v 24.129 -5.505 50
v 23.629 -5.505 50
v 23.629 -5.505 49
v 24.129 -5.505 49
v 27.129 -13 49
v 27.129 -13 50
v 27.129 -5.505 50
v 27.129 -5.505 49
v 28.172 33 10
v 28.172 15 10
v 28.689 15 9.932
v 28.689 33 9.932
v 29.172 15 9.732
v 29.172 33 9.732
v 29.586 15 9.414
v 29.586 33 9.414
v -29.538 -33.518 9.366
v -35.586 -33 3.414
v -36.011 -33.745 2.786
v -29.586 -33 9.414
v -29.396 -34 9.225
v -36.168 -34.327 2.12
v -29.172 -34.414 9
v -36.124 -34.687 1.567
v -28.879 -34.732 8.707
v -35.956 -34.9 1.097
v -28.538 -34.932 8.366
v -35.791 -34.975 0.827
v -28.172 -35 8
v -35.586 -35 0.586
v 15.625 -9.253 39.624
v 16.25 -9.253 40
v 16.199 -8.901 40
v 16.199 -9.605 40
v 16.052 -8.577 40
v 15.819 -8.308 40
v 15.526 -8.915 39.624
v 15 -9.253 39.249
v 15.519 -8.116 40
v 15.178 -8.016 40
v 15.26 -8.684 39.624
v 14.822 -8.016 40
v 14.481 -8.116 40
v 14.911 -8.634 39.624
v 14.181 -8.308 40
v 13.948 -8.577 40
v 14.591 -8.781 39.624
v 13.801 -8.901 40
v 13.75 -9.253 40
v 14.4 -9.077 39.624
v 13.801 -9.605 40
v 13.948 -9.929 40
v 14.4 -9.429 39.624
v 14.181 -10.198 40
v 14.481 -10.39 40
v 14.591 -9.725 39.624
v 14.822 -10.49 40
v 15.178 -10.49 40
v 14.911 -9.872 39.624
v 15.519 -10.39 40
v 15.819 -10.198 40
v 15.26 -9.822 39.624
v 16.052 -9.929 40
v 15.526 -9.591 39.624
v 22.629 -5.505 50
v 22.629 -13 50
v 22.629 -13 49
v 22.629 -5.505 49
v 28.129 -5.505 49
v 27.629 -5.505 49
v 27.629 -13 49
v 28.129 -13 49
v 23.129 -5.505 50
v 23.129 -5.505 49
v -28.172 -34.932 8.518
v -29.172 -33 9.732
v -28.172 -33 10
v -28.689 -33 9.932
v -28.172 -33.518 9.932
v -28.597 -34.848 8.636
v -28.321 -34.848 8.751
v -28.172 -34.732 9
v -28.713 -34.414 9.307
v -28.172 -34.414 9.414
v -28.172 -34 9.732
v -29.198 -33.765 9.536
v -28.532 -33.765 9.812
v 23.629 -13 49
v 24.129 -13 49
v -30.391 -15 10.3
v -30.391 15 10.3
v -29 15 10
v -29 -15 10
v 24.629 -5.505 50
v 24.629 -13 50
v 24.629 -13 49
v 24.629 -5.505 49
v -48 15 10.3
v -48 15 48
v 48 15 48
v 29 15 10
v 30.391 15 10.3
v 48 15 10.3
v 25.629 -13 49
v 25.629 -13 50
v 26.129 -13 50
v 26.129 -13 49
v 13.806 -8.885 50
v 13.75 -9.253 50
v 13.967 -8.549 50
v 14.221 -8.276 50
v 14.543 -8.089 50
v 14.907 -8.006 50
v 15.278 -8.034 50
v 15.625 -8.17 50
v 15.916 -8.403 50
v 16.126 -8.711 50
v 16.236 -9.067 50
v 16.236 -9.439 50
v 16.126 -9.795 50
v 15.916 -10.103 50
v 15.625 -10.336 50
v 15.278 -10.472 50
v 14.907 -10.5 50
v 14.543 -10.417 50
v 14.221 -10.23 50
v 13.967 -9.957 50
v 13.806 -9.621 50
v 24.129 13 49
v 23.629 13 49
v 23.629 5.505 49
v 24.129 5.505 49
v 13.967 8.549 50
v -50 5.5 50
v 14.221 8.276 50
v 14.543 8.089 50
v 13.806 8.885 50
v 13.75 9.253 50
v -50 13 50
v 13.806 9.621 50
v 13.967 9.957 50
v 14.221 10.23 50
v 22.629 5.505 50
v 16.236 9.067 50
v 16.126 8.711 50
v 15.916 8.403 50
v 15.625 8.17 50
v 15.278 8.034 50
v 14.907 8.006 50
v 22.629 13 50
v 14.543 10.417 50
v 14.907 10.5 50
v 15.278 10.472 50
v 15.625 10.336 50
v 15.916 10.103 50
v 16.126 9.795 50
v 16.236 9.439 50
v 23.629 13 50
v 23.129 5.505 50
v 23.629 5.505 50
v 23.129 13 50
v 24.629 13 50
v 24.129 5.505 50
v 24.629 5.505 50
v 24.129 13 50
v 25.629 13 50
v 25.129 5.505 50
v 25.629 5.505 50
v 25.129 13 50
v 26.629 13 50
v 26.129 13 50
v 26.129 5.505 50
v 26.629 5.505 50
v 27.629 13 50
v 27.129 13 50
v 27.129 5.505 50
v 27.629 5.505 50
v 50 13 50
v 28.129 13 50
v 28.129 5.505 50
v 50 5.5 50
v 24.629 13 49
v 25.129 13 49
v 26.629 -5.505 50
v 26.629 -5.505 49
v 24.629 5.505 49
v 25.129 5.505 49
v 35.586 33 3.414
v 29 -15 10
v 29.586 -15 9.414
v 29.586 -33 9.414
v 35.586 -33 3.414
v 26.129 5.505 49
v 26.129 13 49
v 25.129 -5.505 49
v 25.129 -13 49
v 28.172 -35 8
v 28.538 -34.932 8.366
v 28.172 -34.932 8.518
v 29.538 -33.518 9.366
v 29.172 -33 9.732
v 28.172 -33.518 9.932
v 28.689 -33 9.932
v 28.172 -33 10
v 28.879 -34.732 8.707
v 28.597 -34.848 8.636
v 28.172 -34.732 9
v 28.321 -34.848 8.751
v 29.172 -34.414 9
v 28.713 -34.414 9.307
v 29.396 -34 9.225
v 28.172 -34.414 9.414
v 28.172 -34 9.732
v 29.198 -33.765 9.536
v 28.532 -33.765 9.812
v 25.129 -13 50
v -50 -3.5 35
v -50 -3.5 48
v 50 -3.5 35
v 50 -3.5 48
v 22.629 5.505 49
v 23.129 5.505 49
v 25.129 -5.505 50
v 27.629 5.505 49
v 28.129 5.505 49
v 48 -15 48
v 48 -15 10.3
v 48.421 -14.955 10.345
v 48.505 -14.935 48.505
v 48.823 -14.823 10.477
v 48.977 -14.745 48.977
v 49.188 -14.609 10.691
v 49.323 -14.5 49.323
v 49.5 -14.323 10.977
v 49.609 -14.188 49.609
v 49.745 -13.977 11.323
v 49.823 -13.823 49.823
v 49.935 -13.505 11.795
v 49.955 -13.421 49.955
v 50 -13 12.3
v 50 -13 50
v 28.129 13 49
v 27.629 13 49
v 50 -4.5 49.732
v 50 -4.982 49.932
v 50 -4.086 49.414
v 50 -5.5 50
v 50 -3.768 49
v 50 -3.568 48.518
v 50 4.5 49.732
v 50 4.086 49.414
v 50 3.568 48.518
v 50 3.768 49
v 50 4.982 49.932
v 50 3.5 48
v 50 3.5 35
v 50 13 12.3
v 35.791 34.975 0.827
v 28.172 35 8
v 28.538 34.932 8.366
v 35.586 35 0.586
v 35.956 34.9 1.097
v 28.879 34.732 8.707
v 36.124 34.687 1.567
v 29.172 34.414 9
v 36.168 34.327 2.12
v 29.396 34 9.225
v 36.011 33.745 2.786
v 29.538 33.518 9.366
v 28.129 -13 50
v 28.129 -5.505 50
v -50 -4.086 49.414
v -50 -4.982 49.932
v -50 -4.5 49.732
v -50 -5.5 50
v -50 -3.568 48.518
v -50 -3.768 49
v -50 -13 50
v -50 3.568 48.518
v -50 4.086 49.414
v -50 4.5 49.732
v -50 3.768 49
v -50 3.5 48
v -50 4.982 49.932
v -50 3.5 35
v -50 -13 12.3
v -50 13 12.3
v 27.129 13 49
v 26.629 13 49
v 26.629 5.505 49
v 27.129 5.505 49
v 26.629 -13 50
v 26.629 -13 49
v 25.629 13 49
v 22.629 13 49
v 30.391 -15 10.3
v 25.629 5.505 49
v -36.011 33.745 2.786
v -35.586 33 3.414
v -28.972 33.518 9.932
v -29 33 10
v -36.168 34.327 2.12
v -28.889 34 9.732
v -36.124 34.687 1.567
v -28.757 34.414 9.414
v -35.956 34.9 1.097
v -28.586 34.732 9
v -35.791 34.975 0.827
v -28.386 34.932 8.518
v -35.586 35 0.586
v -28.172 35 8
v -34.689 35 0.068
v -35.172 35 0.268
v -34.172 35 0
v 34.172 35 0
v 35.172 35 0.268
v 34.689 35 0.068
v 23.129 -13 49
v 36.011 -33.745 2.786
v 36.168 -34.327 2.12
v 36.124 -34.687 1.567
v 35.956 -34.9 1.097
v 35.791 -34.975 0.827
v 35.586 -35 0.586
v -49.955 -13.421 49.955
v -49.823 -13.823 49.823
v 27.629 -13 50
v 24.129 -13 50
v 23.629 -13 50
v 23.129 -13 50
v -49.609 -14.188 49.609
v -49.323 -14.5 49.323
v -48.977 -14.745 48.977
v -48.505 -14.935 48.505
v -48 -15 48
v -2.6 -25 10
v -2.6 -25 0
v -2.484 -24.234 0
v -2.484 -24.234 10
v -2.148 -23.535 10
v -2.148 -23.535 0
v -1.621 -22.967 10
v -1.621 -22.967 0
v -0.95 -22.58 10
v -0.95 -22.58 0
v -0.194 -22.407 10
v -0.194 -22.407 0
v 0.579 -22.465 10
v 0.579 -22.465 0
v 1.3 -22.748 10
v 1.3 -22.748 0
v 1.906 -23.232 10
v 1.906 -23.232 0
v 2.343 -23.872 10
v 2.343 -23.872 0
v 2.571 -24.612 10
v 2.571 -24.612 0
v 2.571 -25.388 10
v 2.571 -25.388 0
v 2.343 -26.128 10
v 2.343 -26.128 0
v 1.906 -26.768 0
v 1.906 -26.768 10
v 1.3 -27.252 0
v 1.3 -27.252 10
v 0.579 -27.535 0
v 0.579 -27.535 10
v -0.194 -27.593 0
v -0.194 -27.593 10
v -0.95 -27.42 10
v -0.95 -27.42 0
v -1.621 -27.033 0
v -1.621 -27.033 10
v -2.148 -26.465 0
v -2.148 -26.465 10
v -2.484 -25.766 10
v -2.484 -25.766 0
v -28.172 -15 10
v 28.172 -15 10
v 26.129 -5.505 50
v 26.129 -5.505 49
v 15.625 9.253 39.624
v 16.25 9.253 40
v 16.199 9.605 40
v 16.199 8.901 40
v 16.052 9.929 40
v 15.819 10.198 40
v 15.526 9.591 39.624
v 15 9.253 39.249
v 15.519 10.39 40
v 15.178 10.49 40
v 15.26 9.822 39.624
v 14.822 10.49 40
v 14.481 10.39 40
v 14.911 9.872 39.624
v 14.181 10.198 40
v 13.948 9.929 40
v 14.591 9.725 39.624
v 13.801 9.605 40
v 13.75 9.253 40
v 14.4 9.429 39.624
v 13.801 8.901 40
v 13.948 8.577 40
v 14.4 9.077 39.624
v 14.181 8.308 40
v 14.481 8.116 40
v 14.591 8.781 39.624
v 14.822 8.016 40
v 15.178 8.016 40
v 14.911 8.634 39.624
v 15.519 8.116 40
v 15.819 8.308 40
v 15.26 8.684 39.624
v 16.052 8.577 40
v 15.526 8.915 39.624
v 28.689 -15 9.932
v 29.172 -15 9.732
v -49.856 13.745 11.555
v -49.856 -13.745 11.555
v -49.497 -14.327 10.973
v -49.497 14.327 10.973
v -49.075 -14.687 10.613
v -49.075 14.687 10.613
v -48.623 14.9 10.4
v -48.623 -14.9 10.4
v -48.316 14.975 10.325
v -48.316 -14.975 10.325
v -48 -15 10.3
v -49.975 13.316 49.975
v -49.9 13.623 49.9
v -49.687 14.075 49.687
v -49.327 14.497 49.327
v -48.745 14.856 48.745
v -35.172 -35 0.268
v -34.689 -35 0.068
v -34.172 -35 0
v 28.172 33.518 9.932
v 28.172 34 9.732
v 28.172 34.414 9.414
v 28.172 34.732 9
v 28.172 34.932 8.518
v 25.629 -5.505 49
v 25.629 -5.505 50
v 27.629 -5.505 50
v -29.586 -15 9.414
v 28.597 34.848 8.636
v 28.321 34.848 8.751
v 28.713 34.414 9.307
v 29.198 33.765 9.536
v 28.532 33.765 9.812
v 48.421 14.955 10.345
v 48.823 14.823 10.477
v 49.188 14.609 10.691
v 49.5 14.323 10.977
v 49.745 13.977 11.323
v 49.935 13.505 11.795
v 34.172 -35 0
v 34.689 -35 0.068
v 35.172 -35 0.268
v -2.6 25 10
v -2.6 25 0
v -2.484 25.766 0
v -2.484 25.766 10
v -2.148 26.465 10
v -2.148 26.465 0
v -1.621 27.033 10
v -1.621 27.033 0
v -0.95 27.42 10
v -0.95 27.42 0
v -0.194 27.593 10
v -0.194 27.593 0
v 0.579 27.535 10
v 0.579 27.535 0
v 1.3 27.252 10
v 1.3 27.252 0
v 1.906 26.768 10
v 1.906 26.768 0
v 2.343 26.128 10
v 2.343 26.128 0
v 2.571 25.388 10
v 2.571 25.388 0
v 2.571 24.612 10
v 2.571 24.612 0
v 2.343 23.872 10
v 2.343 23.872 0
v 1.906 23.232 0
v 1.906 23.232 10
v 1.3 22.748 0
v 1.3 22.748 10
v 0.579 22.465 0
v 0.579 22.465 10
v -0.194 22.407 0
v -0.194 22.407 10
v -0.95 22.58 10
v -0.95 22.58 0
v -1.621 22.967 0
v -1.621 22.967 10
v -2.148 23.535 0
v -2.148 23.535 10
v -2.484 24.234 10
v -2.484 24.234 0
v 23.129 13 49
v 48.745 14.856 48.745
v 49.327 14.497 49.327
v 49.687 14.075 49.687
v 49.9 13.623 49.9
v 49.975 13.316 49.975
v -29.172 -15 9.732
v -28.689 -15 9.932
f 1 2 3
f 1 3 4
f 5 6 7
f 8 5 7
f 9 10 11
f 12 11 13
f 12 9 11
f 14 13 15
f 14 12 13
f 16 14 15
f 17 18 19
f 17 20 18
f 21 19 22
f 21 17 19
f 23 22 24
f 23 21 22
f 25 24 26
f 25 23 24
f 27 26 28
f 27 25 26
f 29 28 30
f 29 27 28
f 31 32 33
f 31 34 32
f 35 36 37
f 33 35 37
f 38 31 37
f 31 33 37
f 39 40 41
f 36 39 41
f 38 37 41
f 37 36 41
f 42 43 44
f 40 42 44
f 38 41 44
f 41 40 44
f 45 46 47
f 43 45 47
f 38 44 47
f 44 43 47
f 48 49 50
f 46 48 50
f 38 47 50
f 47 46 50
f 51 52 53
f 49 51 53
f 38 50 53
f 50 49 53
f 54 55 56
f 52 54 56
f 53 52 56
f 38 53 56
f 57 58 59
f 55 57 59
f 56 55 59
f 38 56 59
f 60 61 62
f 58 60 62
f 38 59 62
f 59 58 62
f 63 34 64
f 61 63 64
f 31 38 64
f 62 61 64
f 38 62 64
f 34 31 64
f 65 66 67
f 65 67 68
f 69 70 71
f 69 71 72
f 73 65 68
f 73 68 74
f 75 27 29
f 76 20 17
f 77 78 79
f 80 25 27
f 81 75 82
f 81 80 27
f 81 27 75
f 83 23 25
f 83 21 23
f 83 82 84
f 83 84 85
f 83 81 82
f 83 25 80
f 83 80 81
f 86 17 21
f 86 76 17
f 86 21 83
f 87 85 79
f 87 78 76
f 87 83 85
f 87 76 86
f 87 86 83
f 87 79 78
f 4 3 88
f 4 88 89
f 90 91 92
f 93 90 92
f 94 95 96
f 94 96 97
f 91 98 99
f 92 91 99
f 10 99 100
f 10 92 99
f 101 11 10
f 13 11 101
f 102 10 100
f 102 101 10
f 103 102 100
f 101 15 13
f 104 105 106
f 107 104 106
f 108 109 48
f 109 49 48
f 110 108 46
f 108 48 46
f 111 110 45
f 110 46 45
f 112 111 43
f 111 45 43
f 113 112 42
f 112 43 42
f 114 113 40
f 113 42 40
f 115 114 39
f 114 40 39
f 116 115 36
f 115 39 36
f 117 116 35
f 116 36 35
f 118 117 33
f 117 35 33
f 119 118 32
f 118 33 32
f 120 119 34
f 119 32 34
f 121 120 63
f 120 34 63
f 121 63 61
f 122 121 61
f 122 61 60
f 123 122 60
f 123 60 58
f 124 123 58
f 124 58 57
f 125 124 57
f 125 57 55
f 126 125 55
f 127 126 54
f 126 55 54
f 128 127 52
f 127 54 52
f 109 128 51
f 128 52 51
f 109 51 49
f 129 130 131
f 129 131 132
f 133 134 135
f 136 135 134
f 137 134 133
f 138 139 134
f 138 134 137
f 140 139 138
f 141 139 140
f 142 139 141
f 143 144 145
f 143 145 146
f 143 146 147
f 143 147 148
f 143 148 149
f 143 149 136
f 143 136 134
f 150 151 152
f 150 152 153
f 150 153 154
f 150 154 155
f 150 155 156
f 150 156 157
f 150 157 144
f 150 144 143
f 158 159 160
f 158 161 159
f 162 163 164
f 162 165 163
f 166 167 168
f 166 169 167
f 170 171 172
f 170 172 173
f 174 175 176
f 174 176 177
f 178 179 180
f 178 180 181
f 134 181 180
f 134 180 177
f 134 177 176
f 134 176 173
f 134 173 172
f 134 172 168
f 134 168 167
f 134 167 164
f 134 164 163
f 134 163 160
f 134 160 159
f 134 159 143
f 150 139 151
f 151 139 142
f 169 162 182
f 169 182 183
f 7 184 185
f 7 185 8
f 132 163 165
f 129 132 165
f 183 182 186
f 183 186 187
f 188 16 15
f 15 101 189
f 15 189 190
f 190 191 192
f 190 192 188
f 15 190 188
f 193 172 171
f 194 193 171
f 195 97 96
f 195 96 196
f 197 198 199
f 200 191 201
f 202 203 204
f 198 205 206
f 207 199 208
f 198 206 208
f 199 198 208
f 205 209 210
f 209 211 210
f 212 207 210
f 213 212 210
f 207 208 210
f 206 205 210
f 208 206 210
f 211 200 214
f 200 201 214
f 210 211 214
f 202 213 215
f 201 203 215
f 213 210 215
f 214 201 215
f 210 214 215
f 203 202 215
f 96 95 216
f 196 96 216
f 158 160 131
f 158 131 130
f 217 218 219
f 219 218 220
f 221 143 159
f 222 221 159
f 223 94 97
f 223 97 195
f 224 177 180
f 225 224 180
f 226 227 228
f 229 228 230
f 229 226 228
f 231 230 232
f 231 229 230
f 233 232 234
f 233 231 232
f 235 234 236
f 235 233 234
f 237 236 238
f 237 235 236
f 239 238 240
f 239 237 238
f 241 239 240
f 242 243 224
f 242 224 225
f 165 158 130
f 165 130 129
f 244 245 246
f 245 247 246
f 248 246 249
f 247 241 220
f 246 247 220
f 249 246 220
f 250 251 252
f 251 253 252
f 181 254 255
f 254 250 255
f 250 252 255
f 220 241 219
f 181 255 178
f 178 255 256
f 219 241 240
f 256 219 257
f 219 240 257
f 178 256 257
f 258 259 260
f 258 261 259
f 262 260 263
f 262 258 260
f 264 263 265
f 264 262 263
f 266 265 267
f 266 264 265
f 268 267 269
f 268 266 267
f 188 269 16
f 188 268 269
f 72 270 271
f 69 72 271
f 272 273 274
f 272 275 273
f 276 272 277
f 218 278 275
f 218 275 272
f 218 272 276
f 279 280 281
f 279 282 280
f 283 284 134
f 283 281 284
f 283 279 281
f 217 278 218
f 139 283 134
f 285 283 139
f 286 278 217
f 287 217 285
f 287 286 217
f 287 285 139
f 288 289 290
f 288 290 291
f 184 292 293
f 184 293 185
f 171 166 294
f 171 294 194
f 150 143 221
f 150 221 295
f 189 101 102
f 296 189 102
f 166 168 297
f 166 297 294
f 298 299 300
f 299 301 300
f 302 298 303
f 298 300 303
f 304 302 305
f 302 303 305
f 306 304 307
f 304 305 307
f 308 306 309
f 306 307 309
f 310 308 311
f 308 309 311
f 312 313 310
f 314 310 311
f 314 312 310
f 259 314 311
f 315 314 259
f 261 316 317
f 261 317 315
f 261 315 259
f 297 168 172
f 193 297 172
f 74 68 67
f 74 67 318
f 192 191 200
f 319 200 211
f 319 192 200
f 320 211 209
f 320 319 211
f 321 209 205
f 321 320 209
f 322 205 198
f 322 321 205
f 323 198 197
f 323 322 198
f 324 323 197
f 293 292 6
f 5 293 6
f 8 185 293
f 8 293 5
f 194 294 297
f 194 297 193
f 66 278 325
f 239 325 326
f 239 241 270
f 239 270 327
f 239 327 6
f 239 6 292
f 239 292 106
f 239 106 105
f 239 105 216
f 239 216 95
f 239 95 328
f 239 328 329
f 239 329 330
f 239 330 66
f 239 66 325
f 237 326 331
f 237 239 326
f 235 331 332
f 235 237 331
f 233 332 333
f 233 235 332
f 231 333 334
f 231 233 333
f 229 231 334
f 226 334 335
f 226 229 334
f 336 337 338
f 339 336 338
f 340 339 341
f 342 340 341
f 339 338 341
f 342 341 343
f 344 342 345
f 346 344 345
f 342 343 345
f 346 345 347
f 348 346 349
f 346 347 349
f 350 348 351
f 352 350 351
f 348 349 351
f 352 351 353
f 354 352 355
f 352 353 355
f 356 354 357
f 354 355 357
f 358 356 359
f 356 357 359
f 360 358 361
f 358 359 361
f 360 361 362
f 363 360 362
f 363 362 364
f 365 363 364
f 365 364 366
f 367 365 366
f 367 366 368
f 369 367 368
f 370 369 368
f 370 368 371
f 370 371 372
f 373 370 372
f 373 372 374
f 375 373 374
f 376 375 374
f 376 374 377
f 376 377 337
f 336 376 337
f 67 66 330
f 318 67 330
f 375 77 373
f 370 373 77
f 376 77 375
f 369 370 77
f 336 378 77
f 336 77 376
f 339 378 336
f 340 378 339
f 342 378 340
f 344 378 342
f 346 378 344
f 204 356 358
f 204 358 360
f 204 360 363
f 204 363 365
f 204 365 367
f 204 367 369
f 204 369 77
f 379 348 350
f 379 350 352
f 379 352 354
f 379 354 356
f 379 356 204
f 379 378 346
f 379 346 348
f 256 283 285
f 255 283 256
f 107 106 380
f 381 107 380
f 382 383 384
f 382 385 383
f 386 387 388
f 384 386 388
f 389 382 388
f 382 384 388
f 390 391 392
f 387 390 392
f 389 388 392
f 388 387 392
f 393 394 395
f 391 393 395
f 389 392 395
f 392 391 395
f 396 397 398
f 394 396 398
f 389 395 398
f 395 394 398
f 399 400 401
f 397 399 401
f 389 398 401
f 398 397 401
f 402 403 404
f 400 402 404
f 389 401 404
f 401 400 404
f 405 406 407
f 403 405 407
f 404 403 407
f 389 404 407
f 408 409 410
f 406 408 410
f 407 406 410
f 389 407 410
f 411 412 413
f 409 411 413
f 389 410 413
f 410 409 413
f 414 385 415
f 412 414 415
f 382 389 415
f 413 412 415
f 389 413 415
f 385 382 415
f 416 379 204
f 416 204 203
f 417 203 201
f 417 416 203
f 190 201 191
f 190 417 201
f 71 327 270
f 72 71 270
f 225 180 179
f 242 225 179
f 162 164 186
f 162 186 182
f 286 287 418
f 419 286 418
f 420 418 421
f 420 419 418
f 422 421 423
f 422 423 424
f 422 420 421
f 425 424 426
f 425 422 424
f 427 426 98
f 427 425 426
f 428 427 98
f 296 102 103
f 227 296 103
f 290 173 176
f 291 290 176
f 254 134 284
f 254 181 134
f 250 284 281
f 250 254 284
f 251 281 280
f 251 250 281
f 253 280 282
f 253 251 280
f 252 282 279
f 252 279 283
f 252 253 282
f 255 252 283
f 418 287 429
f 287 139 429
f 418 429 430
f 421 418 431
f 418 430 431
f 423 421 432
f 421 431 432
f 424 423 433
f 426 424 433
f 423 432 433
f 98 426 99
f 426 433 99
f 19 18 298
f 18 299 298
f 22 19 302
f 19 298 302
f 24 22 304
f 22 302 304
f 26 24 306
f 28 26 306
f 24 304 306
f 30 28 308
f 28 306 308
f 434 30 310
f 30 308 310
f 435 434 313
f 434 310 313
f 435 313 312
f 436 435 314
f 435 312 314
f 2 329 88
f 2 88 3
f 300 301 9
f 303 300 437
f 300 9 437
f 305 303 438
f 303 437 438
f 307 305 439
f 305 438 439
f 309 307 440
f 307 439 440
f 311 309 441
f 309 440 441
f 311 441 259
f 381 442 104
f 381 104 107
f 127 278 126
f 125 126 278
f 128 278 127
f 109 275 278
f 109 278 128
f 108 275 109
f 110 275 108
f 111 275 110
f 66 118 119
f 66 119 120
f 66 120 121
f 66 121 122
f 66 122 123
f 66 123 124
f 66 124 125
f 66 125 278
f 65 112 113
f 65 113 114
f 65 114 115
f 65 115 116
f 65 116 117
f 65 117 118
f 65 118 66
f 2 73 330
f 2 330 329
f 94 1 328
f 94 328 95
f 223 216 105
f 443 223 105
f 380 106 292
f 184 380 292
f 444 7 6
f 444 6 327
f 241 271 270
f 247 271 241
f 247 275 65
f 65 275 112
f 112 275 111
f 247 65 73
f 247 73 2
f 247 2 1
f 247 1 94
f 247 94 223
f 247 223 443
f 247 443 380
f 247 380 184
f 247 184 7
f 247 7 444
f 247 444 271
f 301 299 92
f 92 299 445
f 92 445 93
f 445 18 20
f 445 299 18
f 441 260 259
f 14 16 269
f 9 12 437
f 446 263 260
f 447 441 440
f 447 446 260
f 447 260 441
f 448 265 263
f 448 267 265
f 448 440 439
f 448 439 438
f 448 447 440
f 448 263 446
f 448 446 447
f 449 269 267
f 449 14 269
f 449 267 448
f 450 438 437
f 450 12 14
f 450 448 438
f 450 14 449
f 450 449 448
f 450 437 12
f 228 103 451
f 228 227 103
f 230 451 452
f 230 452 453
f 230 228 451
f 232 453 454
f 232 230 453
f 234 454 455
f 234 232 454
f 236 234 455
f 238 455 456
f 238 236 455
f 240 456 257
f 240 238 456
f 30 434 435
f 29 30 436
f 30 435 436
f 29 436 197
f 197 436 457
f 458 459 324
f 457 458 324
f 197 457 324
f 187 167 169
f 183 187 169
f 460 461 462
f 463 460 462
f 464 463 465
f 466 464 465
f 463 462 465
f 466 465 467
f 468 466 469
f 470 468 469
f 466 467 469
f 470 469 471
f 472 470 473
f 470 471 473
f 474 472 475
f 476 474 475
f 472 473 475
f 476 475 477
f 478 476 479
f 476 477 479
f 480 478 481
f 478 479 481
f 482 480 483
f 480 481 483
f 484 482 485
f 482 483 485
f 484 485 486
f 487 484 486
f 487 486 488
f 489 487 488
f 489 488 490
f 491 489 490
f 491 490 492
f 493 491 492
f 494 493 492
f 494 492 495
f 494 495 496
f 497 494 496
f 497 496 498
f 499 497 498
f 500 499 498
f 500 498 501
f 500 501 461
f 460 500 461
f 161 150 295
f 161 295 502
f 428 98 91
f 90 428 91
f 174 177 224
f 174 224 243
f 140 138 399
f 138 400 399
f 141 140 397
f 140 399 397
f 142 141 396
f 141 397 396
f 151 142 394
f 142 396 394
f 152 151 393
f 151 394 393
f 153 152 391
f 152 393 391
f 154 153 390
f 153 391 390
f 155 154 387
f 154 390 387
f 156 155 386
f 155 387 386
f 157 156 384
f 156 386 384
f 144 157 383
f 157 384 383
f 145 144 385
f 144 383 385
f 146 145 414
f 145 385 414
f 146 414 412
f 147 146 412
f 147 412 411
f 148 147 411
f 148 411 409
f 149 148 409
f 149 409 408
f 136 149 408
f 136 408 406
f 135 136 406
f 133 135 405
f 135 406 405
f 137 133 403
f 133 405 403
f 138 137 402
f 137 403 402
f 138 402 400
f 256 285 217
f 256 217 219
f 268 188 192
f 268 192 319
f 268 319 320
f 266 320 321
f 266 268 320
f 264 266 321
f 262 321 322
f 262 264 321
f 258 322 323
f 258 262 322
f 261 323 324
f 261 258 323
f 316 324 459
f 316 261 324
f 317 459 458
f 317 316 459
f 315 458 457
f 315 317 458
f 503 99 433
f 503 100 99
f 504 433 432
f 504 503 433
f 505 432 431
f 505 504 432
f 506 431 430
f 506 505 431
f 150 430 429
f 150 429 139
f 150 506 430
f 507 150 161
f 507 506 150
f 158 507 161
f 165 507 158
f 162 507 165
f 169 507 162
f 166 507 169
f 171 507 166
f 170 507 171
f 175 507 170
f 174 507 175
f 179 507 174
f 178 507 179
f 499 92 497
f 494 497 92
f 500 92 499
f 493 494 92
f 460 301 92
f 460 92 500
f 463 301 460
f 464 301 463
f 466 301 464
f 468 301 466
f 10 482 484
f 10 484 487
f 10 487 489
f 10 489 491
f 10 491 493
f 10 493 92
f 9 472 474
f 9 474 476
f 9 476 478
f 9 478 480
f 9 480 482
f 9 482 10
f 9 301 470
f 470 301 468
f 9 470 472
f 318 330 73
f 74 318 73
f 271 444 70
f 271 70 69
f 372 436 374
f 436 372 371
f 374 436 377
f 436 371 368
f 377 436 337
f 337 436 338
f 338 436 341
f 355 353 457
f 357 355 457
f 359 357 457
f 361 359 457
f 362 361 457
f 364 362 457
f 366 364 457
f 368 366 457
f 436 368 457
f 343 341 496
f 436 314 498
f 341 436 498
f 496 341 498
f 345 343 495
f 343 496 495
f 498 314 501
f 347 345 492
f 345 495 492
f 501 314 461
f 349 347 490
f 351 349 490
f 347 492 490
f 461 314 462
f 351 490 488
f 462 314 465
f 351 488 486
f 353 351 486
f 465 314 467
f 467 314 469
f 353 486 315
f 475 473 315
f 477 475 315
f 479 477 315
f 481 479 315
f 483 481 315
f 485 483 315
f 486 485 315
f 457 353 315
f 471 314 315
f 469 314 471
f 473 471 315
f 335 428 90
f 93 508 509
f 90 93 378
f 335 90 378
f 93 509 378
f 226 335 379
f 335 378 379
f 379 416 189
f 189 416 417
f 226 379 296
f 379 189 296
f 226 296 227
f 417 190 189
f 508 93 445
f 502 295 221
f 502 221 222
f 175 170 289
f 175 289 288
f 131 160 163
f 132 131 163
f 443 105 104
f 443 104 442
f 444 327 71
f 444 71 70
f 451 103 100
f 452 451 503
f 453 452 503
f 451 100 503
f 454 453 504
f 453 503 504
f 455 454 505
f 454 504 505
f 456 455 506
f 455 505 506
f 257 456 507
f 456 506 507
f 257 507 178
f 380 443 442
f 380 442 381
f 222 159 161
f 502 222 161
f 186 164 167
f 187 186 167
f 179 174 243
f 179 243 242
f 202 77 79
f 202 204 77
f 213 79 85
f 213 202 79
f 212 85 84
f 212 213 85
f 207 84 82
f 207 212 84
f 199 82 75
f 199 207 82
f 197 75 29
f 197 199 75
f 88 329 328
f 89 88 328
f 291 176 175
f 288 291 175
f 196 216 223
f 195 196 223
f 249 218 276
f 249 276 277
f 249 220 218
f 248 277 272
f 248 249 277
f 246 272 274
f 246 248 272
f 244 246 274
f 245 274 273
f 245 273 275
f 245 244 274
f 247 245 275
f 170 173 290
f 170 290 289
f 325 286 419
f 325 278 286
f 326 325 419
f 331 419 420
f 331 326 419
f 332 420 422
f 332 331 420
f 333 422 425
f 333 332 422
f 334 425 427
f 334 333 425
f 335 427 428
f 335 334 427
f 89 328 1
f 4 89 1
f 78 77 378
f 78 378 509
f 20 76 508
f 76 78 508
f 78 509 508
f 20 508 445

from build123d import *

# Parameters (mm, degrees)
F0_W      = 78
F0_H      = 70
F1_DEPTH  = 10
F3_DEPTH  = 70
F5_D      = 5.2
F6_W      = 100
F6_H      = 30
F7_DEPTH  = 40
F8_W      = 100
F8_H      = 7
F9_DEPTH  = 15
F11_DEPTH = 50.001
F12_R     = 2
F13_W     = 0.5
F13_H     = 7.4945365116
F14_DEPTH = 1
F15_D     = 2.5
F15_DEPTH = 10
F15_TIP   = 0.7510757738


with BuildPart() as f1:
    # F0 (on Top) → F1 (new body)
    with BuildSketch(Plane.XY):
        Rectangle(F0_W, F0_H)
    extrude(amount=F1_DEPTH)

    # F2 (on face) → F3 (cut)
    with BuildSketch(Plane.XZ.offset(35)):
        Polygon((-39, 10), (-39, 0), (-29, 10), align=None)
        Polygon((29, 10), (39, 0), (39, 10), align=None)
    extrude(amount=-F3_DEPTH, mode=Mode.SUBTRACT)

    # F5 (through all)
    with Locations(Plane.XY.offset(10)):
        with Locations((0, 25), (0, -25)):
            Hole(F5_D / 2)

    # F6 (on face) → F7 (join)
    with BuildSketch(Plane.XY.offset(10)):
        Rectangle(F6_W, F6_H)
    extrude(amount=F7_DEPTH)

    # F8 (on face) → F9 (cut)
    with BuildSketch(Plane.XY.offset(50)):
        Rectangle(F8_W, F8_H)
    extrude(amount=-F9_DEPTH, mode=Mode.SUBTRACT)

    # F10 (on face) → F11 (cut, through all)
    with BuildSketch(Plane(origin=(0, 15, 0), x_dir=(-1, 0, 0), z_dir=(0, 1, 0))):
        Polygon((-50, 10), (-29, 10), (-30.3908418864, 10.3), (-50, 10.3), align=None)
        Polygon((30.3908418864, 10.3), (29, 10), (50, 10), (50, 10.3), align=None)
    extrude(amount=-F11_DEPTH, mode=Mode.SUBTRACT)

    # F12
    f12_edges = [f1.edges().sort_by_distance(p)[0] for p in [
        (29, -25, 10),
        (29, 25, 10),
        (34, 35, 5),
        (39, 0, 0),
        (34, -35, 5),
        (0, 35, 10),
        (0, -35, 10),
        (0, -15, 50),
        (0, -3.5, 50),
        (0, 3.5, 50),
        (0, 15, 50),
        (50, 15, 30.15),
        (50, -15, 30.15),
        (50, 0, 10.3),
        (-29, -25, 10),
        (-50, -15, 30.15),
        (-50, 15, 30.15),
        (-50, 0, 10.3),
        (-39, 0, 0),
        (-34, -35, 5),
        (-34, 35, 5),
    ]]
    fillet(f12_edges, radius=F12_R)

    # F13 (on face) → F14 (cut)
    with BuildSketch(Plane.XY.offset(50)):
        with Locations((27.87883, 9.2527317442)):
            Rectangle(F13_W, F13_H)
        with Locations((26.87883, 9.2527317442)):
            Rectangle(F13_W, F13_H)
        with Locations((25.87883, 9.2527317442)):
            Rectangle(F13_W, F13_H)
        with Locations((24.87883, 9.2527317442)):
            Rectangle(F13_W, F13_H)
        with Locations((23.87883, 9.2527317442)):
            Rectangle(F13_W, F13_H)
        with Locations((22.87883, 9.2527317442)):
            Rectangle(F13_W, F13_H)
        with Locations((27.87883, -9.2527317442)):
            Rectangle(F13_W, F13_H)
        with Locations((26.87883, -9.2527317442)):
            Rectangle(F13_W, F13_H)
        with Locations((25.87883, -9.2527317442)):
            Rectangle(F13_W, F13_H)
        with Locations((24.87883, -9.2527317442)):
            Rectangle(F13_W, F13_H)
        with Locations((23.87883, -9.2527317442)):
            Rectangle(F13_W, F13_H)
        with Locations((22.87883, -9.2527317442)):
            Rectangle(F13_W, F13_H)
    extrude(amount=-F14_DEPTH, mode=Mode.SUBTRACT)

    # F15
    with Locations(Plane.XY.offset(50)):
        with Locations((15, 9.253), (15, -9.253)):
            Hole(F15_D / 2, depth=F15_DEPTH)
            with Locations((0, 0, -(F15_DEPTH + F15_TIP / 2))):  # 118° drill point
                Cone(0, F15_D / 2, F15_TIP, mode=Mode.SUBTRACT)


solid = f1.part
